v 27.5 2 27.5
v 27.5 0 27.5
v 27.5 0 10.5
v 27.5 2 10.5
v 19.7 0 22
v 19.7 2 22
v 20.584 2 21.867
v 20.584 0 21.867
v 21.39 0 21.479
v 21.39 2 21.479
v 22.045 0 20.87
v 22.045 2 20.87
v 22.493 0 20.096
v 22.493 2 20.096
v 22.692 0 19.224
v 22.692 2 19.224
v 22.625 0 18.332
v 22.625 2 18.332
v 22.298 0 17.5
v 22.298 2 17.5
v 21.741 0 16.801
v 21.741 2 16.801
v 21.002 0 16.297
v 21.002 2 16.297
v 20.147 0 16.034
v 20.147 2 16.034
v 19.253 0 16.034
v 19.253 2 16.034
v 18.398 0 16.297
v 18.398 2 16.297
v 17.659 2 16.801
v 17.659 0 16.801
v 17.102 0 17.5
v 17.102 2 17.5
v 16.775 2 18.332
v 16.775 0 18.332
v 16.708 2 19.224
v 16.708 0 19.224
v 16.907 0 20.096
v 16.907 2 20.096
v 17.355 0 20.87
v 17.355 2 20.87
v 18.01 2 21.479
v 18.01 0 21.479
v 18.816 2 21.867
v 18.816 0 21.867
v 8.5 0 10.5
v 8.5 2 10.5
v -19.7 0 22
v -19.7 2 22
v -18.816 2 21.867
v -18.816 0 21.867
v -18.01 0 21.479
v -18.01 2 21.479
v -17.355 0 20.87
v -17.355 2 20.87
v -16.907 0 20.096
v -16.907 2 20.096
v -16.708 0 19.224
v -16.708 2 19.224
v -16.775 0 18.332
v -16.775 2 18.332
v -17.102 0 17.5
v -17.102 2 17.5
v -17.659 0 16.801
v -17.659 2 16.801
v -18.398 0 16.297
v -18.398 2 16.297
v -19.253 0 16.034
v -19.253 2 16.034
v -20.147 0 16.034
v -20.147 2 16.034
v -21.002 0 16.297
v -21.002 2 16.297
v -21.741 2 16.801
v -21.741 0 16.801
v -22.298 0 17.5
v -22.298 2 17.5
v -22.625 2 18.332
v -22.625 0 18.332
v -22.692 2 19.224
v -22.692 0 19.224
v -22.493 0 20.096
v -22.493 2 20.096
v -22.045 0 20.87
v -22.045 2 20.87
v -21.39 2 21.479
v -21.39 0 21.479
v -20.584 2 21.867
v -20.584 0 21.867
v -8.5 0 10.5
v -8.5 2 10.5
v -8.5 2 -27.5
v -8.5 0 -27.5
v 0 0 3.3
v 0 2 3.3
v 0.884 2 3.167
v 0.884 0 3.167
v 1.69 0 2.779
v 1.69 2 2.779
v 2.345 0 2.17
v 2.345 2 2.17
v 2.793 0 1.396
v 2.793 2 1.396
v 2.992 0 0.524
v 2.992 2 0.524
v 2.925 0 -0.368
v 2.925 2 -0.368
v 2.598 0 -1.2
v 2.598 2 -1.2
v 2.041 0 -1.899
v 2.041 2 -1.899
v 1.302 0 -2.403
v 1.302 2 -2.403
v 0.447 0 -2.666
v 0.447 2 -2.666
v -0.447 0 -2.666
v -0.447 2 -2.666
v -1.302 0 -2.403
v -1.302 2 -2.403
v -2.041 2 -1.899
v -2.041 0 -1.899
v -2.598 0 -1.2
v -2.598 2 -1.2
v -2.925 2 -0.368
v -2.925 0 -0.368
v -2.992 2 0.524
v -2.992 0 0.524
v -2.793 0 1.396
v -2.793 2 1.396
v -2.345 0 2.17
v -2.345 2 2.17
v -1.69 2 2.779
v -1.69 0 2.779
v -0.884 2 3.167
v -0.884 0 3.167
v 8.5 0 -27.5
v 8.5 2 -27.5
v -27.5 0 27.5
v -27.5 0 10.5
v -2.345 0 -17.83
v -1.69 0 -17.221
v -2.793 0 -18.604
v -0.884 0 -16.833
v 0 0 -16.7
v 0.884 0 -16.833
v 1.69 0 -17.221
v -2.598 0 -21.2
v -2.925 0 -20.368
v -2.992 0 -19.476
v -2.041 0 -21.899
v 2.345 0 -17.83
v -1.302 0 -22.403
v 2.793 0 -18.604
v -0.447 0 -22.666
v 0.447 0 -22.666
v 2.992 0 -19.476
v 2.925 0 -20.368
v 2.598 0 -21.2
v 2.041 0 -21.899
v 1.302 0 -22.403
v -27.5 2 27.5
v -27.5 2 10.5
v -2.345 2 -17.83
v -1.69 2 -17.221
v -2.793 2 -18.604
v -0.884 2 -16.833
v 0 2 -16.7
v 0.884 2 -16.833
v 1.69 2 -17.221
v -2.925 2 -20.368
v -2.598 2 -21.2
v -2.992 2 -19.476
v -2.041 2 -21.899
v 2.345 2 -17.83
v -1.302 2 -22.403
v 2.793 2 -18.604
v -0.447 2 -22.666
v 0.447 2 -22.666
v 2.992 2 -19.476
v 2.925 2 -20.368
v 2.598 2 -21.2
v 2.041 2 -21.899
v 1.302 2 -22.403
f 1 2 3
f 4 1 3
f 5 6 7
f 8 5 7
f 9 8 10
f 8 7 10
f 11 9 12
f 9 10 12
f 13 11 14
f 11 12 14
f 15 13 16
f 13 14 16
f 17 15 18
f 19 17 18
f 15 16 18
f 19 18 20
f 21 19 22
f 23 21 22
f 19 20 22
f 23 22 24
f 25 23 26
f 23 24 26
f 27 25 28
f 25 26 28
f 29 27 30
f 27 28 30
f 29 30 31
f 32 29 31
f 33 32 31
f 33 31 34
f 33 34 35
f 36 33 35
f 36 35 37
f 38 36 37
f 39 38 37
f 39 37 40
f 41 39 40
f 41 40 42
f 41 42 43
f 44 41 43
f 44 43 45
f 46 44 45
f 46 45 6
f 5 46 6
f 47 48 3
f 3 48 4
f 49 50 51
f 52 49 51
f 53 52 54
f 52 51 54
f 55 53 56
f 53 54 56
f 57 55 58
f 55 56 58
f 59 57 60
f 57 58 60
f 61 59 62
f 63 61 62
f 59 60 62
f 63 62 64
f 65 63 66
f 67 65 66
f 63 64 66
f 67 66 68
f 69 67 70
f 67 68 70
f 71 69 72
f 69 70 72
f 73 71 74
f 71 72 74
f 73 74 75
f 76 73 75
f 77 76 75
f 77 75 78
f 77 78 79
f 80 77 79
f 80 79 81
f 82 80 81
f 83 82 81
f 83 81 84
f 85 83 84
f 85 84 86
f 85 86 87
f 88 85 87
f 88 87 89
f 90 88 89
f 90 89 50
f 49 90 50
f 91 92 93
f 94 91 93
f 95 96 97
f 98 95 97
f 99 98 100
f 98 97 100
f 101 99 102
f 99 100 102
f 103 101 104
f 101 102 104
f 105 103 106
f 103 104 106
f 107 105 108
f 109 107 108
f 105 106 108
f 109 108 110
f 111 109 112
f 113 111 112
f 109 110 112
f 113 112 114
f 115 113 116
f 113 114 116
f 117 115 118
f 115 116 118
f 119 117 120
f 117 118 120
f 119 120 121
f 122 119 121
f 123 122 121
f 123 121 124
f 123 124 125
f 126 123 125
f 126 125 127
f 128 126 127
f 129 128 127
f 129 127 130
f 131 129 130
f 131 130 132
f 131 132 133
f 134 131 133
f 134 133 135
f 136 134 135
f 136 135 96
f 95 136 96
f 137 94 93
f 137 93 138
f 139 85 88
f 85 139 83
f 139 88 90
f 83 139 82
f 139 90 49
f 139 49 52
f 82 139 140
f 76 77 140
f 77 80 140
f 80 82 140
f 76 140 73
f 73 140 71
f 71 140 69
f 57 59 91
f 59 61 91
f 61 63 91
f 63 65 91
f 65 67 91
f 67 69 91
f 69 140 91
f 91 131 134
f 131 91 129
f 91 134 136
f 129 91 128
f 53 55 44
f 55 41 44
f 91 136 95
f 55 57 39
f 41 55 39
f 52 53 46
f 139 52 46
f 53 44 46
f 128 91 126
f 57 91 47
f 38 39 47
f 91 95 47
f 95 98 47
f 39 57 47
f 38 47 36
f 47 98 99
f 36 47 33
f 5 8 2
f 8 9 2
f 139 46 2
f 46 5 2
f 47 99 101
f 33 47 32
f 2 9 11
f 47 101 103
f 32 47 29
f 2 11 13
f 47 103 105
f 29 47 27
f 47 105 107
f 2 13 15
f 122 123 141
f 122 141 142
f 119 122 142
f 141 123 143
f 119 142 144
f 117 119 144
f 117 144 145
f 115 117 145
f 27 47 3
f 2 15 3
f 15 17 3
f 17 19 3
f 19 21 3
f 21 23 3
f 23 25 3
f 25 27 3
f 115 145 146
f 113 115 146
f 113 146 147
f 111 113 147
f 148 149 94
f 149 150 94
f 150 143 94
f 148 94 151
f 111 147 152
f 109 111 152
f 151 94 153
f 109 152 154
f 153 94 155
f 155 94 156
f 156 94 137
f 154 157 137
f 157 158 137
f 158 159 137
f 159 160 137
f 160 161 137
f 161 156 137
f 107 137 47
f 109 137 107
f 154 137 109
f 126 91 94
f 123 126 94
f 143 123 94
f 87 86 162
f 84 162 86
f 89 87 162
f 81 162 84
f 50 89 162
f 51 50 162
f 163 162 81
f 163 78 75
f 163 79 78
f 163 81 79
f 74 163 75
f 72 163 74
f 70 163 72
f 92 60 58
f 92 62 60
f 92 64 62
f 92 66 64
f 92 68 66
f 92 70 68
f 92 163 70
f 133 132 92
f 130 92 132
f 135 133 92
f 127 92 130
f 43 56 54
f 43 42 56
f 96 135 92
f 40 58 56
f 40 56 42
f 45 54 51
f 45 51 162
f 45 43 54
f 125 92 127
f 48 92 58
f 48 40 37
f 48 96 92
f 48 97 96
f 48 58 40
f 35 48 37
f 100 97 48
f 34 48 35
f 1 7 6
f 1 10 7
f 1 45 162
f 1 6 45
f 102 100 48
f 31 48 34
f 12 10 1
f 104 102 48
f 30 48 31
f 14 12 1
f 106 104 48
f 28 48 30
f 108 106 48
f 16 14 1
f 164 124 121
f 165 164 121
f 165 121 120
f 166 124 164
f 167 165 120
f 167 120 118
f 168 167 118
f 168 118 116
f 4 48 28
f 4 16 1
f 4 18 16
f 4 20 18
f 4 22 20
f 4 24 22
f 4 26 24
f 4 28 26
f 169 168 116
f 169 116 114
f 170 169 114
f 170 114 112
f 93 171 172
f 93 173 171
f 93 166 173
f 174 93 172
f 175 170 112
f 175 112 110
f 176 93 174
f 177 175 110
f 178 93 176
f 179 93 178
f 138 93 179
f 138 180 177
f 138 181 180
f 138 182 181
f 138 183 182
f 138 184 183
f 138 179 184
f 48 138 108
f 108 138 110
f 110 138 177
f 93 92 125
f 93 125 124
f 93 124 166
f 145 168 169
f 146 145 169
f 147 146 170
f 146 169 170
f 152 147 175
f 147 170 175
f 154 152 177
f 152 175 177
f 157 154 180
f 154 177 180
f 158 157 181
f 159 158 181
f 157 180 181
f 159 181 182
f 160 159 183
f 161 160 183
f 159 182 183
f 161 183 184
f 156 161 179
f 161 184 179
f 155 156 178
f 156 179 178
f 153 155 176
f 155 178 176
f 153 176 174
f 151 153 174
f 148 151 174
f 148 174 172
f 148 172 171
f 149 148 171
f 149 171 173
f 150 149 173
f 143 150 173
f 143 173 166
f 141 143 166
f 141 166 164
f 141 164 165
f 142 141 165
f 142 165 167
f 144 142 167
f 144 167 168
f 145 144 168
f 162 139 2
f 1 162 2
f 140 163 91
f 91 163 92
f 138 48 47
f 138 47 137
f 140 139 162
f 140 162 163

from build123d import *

# Parameters (mm, degrees)
SKETCH_1_W          = 55
SKETCH_1_H          = 55
EXTRUDE_1_DEPTH     = 2
SKETCH_2_W          = 19
SKETCH_2_H          = 38
CUT_EXTRUDE_1_DEPTH = 39.942264957
SKETCH_3_R          = 3
CUT_EXTRUDE_2_DEPTH = 39.942264957


with BuildPart() as part:
    # 草图1 → 凸台-拉伸1 (new body)
    with BuildSketch(Plane(origin=(0, 0, 0), x_dir=(1, 0, 0), z_dir=(0, 1, 0))):
        Rectangle(SKETCH_1_W, SKETCH_1_H)
    extrude(amount=EXTRUDE_1_DEPTH)

    # 草图2 → 切除-拉伸1 (cut, through all)
    with BuildSketch(Plane(origin=(0, 2, 0), x_dir=(1, 0, 0), z_dir=(0, 1, 0))):
        with Locations((-18, 8.5)):
            Rectangle(SKETCH_2_W, SKETCH_2_H)
        with Locations((18, 8.5)):
            Rectangle(SKETCH_2_W, SKETCH_2_H)
    extrude(amount=-CUT_EXTRUDE_1_DEPTH, mode=Mode.SUBTRACT)

    # 草图3 → 切除-拉伸2 (cut, through all)
    with BuildSketch(Plane(origin=(0, 2, 0), x_dir=(1, 0, 0), z_dir=(0, 1, 0))):
        with Locations(Location((-19.7, -19, 0), (0, 0, 270))):
            Circle(SKETCH_3_R)
        with Locations(Location((19.7, -19, 0), (0, 0, 270))):
            Circle(SKETCH_3_R)
        with Locations(Location((0, -0.3, 0), (0, 0, 270))):
            Circle(SKETCH_3_R)
        with Locations(Location((0, 19.7, 0), (0, 0, 270))):
            Circle(SKETCH_3_R)
    extrude(amount=-CUT_EXTRUDE_2_DEPTH, mode=Mode.SUBTRACT)


solid = part.part
